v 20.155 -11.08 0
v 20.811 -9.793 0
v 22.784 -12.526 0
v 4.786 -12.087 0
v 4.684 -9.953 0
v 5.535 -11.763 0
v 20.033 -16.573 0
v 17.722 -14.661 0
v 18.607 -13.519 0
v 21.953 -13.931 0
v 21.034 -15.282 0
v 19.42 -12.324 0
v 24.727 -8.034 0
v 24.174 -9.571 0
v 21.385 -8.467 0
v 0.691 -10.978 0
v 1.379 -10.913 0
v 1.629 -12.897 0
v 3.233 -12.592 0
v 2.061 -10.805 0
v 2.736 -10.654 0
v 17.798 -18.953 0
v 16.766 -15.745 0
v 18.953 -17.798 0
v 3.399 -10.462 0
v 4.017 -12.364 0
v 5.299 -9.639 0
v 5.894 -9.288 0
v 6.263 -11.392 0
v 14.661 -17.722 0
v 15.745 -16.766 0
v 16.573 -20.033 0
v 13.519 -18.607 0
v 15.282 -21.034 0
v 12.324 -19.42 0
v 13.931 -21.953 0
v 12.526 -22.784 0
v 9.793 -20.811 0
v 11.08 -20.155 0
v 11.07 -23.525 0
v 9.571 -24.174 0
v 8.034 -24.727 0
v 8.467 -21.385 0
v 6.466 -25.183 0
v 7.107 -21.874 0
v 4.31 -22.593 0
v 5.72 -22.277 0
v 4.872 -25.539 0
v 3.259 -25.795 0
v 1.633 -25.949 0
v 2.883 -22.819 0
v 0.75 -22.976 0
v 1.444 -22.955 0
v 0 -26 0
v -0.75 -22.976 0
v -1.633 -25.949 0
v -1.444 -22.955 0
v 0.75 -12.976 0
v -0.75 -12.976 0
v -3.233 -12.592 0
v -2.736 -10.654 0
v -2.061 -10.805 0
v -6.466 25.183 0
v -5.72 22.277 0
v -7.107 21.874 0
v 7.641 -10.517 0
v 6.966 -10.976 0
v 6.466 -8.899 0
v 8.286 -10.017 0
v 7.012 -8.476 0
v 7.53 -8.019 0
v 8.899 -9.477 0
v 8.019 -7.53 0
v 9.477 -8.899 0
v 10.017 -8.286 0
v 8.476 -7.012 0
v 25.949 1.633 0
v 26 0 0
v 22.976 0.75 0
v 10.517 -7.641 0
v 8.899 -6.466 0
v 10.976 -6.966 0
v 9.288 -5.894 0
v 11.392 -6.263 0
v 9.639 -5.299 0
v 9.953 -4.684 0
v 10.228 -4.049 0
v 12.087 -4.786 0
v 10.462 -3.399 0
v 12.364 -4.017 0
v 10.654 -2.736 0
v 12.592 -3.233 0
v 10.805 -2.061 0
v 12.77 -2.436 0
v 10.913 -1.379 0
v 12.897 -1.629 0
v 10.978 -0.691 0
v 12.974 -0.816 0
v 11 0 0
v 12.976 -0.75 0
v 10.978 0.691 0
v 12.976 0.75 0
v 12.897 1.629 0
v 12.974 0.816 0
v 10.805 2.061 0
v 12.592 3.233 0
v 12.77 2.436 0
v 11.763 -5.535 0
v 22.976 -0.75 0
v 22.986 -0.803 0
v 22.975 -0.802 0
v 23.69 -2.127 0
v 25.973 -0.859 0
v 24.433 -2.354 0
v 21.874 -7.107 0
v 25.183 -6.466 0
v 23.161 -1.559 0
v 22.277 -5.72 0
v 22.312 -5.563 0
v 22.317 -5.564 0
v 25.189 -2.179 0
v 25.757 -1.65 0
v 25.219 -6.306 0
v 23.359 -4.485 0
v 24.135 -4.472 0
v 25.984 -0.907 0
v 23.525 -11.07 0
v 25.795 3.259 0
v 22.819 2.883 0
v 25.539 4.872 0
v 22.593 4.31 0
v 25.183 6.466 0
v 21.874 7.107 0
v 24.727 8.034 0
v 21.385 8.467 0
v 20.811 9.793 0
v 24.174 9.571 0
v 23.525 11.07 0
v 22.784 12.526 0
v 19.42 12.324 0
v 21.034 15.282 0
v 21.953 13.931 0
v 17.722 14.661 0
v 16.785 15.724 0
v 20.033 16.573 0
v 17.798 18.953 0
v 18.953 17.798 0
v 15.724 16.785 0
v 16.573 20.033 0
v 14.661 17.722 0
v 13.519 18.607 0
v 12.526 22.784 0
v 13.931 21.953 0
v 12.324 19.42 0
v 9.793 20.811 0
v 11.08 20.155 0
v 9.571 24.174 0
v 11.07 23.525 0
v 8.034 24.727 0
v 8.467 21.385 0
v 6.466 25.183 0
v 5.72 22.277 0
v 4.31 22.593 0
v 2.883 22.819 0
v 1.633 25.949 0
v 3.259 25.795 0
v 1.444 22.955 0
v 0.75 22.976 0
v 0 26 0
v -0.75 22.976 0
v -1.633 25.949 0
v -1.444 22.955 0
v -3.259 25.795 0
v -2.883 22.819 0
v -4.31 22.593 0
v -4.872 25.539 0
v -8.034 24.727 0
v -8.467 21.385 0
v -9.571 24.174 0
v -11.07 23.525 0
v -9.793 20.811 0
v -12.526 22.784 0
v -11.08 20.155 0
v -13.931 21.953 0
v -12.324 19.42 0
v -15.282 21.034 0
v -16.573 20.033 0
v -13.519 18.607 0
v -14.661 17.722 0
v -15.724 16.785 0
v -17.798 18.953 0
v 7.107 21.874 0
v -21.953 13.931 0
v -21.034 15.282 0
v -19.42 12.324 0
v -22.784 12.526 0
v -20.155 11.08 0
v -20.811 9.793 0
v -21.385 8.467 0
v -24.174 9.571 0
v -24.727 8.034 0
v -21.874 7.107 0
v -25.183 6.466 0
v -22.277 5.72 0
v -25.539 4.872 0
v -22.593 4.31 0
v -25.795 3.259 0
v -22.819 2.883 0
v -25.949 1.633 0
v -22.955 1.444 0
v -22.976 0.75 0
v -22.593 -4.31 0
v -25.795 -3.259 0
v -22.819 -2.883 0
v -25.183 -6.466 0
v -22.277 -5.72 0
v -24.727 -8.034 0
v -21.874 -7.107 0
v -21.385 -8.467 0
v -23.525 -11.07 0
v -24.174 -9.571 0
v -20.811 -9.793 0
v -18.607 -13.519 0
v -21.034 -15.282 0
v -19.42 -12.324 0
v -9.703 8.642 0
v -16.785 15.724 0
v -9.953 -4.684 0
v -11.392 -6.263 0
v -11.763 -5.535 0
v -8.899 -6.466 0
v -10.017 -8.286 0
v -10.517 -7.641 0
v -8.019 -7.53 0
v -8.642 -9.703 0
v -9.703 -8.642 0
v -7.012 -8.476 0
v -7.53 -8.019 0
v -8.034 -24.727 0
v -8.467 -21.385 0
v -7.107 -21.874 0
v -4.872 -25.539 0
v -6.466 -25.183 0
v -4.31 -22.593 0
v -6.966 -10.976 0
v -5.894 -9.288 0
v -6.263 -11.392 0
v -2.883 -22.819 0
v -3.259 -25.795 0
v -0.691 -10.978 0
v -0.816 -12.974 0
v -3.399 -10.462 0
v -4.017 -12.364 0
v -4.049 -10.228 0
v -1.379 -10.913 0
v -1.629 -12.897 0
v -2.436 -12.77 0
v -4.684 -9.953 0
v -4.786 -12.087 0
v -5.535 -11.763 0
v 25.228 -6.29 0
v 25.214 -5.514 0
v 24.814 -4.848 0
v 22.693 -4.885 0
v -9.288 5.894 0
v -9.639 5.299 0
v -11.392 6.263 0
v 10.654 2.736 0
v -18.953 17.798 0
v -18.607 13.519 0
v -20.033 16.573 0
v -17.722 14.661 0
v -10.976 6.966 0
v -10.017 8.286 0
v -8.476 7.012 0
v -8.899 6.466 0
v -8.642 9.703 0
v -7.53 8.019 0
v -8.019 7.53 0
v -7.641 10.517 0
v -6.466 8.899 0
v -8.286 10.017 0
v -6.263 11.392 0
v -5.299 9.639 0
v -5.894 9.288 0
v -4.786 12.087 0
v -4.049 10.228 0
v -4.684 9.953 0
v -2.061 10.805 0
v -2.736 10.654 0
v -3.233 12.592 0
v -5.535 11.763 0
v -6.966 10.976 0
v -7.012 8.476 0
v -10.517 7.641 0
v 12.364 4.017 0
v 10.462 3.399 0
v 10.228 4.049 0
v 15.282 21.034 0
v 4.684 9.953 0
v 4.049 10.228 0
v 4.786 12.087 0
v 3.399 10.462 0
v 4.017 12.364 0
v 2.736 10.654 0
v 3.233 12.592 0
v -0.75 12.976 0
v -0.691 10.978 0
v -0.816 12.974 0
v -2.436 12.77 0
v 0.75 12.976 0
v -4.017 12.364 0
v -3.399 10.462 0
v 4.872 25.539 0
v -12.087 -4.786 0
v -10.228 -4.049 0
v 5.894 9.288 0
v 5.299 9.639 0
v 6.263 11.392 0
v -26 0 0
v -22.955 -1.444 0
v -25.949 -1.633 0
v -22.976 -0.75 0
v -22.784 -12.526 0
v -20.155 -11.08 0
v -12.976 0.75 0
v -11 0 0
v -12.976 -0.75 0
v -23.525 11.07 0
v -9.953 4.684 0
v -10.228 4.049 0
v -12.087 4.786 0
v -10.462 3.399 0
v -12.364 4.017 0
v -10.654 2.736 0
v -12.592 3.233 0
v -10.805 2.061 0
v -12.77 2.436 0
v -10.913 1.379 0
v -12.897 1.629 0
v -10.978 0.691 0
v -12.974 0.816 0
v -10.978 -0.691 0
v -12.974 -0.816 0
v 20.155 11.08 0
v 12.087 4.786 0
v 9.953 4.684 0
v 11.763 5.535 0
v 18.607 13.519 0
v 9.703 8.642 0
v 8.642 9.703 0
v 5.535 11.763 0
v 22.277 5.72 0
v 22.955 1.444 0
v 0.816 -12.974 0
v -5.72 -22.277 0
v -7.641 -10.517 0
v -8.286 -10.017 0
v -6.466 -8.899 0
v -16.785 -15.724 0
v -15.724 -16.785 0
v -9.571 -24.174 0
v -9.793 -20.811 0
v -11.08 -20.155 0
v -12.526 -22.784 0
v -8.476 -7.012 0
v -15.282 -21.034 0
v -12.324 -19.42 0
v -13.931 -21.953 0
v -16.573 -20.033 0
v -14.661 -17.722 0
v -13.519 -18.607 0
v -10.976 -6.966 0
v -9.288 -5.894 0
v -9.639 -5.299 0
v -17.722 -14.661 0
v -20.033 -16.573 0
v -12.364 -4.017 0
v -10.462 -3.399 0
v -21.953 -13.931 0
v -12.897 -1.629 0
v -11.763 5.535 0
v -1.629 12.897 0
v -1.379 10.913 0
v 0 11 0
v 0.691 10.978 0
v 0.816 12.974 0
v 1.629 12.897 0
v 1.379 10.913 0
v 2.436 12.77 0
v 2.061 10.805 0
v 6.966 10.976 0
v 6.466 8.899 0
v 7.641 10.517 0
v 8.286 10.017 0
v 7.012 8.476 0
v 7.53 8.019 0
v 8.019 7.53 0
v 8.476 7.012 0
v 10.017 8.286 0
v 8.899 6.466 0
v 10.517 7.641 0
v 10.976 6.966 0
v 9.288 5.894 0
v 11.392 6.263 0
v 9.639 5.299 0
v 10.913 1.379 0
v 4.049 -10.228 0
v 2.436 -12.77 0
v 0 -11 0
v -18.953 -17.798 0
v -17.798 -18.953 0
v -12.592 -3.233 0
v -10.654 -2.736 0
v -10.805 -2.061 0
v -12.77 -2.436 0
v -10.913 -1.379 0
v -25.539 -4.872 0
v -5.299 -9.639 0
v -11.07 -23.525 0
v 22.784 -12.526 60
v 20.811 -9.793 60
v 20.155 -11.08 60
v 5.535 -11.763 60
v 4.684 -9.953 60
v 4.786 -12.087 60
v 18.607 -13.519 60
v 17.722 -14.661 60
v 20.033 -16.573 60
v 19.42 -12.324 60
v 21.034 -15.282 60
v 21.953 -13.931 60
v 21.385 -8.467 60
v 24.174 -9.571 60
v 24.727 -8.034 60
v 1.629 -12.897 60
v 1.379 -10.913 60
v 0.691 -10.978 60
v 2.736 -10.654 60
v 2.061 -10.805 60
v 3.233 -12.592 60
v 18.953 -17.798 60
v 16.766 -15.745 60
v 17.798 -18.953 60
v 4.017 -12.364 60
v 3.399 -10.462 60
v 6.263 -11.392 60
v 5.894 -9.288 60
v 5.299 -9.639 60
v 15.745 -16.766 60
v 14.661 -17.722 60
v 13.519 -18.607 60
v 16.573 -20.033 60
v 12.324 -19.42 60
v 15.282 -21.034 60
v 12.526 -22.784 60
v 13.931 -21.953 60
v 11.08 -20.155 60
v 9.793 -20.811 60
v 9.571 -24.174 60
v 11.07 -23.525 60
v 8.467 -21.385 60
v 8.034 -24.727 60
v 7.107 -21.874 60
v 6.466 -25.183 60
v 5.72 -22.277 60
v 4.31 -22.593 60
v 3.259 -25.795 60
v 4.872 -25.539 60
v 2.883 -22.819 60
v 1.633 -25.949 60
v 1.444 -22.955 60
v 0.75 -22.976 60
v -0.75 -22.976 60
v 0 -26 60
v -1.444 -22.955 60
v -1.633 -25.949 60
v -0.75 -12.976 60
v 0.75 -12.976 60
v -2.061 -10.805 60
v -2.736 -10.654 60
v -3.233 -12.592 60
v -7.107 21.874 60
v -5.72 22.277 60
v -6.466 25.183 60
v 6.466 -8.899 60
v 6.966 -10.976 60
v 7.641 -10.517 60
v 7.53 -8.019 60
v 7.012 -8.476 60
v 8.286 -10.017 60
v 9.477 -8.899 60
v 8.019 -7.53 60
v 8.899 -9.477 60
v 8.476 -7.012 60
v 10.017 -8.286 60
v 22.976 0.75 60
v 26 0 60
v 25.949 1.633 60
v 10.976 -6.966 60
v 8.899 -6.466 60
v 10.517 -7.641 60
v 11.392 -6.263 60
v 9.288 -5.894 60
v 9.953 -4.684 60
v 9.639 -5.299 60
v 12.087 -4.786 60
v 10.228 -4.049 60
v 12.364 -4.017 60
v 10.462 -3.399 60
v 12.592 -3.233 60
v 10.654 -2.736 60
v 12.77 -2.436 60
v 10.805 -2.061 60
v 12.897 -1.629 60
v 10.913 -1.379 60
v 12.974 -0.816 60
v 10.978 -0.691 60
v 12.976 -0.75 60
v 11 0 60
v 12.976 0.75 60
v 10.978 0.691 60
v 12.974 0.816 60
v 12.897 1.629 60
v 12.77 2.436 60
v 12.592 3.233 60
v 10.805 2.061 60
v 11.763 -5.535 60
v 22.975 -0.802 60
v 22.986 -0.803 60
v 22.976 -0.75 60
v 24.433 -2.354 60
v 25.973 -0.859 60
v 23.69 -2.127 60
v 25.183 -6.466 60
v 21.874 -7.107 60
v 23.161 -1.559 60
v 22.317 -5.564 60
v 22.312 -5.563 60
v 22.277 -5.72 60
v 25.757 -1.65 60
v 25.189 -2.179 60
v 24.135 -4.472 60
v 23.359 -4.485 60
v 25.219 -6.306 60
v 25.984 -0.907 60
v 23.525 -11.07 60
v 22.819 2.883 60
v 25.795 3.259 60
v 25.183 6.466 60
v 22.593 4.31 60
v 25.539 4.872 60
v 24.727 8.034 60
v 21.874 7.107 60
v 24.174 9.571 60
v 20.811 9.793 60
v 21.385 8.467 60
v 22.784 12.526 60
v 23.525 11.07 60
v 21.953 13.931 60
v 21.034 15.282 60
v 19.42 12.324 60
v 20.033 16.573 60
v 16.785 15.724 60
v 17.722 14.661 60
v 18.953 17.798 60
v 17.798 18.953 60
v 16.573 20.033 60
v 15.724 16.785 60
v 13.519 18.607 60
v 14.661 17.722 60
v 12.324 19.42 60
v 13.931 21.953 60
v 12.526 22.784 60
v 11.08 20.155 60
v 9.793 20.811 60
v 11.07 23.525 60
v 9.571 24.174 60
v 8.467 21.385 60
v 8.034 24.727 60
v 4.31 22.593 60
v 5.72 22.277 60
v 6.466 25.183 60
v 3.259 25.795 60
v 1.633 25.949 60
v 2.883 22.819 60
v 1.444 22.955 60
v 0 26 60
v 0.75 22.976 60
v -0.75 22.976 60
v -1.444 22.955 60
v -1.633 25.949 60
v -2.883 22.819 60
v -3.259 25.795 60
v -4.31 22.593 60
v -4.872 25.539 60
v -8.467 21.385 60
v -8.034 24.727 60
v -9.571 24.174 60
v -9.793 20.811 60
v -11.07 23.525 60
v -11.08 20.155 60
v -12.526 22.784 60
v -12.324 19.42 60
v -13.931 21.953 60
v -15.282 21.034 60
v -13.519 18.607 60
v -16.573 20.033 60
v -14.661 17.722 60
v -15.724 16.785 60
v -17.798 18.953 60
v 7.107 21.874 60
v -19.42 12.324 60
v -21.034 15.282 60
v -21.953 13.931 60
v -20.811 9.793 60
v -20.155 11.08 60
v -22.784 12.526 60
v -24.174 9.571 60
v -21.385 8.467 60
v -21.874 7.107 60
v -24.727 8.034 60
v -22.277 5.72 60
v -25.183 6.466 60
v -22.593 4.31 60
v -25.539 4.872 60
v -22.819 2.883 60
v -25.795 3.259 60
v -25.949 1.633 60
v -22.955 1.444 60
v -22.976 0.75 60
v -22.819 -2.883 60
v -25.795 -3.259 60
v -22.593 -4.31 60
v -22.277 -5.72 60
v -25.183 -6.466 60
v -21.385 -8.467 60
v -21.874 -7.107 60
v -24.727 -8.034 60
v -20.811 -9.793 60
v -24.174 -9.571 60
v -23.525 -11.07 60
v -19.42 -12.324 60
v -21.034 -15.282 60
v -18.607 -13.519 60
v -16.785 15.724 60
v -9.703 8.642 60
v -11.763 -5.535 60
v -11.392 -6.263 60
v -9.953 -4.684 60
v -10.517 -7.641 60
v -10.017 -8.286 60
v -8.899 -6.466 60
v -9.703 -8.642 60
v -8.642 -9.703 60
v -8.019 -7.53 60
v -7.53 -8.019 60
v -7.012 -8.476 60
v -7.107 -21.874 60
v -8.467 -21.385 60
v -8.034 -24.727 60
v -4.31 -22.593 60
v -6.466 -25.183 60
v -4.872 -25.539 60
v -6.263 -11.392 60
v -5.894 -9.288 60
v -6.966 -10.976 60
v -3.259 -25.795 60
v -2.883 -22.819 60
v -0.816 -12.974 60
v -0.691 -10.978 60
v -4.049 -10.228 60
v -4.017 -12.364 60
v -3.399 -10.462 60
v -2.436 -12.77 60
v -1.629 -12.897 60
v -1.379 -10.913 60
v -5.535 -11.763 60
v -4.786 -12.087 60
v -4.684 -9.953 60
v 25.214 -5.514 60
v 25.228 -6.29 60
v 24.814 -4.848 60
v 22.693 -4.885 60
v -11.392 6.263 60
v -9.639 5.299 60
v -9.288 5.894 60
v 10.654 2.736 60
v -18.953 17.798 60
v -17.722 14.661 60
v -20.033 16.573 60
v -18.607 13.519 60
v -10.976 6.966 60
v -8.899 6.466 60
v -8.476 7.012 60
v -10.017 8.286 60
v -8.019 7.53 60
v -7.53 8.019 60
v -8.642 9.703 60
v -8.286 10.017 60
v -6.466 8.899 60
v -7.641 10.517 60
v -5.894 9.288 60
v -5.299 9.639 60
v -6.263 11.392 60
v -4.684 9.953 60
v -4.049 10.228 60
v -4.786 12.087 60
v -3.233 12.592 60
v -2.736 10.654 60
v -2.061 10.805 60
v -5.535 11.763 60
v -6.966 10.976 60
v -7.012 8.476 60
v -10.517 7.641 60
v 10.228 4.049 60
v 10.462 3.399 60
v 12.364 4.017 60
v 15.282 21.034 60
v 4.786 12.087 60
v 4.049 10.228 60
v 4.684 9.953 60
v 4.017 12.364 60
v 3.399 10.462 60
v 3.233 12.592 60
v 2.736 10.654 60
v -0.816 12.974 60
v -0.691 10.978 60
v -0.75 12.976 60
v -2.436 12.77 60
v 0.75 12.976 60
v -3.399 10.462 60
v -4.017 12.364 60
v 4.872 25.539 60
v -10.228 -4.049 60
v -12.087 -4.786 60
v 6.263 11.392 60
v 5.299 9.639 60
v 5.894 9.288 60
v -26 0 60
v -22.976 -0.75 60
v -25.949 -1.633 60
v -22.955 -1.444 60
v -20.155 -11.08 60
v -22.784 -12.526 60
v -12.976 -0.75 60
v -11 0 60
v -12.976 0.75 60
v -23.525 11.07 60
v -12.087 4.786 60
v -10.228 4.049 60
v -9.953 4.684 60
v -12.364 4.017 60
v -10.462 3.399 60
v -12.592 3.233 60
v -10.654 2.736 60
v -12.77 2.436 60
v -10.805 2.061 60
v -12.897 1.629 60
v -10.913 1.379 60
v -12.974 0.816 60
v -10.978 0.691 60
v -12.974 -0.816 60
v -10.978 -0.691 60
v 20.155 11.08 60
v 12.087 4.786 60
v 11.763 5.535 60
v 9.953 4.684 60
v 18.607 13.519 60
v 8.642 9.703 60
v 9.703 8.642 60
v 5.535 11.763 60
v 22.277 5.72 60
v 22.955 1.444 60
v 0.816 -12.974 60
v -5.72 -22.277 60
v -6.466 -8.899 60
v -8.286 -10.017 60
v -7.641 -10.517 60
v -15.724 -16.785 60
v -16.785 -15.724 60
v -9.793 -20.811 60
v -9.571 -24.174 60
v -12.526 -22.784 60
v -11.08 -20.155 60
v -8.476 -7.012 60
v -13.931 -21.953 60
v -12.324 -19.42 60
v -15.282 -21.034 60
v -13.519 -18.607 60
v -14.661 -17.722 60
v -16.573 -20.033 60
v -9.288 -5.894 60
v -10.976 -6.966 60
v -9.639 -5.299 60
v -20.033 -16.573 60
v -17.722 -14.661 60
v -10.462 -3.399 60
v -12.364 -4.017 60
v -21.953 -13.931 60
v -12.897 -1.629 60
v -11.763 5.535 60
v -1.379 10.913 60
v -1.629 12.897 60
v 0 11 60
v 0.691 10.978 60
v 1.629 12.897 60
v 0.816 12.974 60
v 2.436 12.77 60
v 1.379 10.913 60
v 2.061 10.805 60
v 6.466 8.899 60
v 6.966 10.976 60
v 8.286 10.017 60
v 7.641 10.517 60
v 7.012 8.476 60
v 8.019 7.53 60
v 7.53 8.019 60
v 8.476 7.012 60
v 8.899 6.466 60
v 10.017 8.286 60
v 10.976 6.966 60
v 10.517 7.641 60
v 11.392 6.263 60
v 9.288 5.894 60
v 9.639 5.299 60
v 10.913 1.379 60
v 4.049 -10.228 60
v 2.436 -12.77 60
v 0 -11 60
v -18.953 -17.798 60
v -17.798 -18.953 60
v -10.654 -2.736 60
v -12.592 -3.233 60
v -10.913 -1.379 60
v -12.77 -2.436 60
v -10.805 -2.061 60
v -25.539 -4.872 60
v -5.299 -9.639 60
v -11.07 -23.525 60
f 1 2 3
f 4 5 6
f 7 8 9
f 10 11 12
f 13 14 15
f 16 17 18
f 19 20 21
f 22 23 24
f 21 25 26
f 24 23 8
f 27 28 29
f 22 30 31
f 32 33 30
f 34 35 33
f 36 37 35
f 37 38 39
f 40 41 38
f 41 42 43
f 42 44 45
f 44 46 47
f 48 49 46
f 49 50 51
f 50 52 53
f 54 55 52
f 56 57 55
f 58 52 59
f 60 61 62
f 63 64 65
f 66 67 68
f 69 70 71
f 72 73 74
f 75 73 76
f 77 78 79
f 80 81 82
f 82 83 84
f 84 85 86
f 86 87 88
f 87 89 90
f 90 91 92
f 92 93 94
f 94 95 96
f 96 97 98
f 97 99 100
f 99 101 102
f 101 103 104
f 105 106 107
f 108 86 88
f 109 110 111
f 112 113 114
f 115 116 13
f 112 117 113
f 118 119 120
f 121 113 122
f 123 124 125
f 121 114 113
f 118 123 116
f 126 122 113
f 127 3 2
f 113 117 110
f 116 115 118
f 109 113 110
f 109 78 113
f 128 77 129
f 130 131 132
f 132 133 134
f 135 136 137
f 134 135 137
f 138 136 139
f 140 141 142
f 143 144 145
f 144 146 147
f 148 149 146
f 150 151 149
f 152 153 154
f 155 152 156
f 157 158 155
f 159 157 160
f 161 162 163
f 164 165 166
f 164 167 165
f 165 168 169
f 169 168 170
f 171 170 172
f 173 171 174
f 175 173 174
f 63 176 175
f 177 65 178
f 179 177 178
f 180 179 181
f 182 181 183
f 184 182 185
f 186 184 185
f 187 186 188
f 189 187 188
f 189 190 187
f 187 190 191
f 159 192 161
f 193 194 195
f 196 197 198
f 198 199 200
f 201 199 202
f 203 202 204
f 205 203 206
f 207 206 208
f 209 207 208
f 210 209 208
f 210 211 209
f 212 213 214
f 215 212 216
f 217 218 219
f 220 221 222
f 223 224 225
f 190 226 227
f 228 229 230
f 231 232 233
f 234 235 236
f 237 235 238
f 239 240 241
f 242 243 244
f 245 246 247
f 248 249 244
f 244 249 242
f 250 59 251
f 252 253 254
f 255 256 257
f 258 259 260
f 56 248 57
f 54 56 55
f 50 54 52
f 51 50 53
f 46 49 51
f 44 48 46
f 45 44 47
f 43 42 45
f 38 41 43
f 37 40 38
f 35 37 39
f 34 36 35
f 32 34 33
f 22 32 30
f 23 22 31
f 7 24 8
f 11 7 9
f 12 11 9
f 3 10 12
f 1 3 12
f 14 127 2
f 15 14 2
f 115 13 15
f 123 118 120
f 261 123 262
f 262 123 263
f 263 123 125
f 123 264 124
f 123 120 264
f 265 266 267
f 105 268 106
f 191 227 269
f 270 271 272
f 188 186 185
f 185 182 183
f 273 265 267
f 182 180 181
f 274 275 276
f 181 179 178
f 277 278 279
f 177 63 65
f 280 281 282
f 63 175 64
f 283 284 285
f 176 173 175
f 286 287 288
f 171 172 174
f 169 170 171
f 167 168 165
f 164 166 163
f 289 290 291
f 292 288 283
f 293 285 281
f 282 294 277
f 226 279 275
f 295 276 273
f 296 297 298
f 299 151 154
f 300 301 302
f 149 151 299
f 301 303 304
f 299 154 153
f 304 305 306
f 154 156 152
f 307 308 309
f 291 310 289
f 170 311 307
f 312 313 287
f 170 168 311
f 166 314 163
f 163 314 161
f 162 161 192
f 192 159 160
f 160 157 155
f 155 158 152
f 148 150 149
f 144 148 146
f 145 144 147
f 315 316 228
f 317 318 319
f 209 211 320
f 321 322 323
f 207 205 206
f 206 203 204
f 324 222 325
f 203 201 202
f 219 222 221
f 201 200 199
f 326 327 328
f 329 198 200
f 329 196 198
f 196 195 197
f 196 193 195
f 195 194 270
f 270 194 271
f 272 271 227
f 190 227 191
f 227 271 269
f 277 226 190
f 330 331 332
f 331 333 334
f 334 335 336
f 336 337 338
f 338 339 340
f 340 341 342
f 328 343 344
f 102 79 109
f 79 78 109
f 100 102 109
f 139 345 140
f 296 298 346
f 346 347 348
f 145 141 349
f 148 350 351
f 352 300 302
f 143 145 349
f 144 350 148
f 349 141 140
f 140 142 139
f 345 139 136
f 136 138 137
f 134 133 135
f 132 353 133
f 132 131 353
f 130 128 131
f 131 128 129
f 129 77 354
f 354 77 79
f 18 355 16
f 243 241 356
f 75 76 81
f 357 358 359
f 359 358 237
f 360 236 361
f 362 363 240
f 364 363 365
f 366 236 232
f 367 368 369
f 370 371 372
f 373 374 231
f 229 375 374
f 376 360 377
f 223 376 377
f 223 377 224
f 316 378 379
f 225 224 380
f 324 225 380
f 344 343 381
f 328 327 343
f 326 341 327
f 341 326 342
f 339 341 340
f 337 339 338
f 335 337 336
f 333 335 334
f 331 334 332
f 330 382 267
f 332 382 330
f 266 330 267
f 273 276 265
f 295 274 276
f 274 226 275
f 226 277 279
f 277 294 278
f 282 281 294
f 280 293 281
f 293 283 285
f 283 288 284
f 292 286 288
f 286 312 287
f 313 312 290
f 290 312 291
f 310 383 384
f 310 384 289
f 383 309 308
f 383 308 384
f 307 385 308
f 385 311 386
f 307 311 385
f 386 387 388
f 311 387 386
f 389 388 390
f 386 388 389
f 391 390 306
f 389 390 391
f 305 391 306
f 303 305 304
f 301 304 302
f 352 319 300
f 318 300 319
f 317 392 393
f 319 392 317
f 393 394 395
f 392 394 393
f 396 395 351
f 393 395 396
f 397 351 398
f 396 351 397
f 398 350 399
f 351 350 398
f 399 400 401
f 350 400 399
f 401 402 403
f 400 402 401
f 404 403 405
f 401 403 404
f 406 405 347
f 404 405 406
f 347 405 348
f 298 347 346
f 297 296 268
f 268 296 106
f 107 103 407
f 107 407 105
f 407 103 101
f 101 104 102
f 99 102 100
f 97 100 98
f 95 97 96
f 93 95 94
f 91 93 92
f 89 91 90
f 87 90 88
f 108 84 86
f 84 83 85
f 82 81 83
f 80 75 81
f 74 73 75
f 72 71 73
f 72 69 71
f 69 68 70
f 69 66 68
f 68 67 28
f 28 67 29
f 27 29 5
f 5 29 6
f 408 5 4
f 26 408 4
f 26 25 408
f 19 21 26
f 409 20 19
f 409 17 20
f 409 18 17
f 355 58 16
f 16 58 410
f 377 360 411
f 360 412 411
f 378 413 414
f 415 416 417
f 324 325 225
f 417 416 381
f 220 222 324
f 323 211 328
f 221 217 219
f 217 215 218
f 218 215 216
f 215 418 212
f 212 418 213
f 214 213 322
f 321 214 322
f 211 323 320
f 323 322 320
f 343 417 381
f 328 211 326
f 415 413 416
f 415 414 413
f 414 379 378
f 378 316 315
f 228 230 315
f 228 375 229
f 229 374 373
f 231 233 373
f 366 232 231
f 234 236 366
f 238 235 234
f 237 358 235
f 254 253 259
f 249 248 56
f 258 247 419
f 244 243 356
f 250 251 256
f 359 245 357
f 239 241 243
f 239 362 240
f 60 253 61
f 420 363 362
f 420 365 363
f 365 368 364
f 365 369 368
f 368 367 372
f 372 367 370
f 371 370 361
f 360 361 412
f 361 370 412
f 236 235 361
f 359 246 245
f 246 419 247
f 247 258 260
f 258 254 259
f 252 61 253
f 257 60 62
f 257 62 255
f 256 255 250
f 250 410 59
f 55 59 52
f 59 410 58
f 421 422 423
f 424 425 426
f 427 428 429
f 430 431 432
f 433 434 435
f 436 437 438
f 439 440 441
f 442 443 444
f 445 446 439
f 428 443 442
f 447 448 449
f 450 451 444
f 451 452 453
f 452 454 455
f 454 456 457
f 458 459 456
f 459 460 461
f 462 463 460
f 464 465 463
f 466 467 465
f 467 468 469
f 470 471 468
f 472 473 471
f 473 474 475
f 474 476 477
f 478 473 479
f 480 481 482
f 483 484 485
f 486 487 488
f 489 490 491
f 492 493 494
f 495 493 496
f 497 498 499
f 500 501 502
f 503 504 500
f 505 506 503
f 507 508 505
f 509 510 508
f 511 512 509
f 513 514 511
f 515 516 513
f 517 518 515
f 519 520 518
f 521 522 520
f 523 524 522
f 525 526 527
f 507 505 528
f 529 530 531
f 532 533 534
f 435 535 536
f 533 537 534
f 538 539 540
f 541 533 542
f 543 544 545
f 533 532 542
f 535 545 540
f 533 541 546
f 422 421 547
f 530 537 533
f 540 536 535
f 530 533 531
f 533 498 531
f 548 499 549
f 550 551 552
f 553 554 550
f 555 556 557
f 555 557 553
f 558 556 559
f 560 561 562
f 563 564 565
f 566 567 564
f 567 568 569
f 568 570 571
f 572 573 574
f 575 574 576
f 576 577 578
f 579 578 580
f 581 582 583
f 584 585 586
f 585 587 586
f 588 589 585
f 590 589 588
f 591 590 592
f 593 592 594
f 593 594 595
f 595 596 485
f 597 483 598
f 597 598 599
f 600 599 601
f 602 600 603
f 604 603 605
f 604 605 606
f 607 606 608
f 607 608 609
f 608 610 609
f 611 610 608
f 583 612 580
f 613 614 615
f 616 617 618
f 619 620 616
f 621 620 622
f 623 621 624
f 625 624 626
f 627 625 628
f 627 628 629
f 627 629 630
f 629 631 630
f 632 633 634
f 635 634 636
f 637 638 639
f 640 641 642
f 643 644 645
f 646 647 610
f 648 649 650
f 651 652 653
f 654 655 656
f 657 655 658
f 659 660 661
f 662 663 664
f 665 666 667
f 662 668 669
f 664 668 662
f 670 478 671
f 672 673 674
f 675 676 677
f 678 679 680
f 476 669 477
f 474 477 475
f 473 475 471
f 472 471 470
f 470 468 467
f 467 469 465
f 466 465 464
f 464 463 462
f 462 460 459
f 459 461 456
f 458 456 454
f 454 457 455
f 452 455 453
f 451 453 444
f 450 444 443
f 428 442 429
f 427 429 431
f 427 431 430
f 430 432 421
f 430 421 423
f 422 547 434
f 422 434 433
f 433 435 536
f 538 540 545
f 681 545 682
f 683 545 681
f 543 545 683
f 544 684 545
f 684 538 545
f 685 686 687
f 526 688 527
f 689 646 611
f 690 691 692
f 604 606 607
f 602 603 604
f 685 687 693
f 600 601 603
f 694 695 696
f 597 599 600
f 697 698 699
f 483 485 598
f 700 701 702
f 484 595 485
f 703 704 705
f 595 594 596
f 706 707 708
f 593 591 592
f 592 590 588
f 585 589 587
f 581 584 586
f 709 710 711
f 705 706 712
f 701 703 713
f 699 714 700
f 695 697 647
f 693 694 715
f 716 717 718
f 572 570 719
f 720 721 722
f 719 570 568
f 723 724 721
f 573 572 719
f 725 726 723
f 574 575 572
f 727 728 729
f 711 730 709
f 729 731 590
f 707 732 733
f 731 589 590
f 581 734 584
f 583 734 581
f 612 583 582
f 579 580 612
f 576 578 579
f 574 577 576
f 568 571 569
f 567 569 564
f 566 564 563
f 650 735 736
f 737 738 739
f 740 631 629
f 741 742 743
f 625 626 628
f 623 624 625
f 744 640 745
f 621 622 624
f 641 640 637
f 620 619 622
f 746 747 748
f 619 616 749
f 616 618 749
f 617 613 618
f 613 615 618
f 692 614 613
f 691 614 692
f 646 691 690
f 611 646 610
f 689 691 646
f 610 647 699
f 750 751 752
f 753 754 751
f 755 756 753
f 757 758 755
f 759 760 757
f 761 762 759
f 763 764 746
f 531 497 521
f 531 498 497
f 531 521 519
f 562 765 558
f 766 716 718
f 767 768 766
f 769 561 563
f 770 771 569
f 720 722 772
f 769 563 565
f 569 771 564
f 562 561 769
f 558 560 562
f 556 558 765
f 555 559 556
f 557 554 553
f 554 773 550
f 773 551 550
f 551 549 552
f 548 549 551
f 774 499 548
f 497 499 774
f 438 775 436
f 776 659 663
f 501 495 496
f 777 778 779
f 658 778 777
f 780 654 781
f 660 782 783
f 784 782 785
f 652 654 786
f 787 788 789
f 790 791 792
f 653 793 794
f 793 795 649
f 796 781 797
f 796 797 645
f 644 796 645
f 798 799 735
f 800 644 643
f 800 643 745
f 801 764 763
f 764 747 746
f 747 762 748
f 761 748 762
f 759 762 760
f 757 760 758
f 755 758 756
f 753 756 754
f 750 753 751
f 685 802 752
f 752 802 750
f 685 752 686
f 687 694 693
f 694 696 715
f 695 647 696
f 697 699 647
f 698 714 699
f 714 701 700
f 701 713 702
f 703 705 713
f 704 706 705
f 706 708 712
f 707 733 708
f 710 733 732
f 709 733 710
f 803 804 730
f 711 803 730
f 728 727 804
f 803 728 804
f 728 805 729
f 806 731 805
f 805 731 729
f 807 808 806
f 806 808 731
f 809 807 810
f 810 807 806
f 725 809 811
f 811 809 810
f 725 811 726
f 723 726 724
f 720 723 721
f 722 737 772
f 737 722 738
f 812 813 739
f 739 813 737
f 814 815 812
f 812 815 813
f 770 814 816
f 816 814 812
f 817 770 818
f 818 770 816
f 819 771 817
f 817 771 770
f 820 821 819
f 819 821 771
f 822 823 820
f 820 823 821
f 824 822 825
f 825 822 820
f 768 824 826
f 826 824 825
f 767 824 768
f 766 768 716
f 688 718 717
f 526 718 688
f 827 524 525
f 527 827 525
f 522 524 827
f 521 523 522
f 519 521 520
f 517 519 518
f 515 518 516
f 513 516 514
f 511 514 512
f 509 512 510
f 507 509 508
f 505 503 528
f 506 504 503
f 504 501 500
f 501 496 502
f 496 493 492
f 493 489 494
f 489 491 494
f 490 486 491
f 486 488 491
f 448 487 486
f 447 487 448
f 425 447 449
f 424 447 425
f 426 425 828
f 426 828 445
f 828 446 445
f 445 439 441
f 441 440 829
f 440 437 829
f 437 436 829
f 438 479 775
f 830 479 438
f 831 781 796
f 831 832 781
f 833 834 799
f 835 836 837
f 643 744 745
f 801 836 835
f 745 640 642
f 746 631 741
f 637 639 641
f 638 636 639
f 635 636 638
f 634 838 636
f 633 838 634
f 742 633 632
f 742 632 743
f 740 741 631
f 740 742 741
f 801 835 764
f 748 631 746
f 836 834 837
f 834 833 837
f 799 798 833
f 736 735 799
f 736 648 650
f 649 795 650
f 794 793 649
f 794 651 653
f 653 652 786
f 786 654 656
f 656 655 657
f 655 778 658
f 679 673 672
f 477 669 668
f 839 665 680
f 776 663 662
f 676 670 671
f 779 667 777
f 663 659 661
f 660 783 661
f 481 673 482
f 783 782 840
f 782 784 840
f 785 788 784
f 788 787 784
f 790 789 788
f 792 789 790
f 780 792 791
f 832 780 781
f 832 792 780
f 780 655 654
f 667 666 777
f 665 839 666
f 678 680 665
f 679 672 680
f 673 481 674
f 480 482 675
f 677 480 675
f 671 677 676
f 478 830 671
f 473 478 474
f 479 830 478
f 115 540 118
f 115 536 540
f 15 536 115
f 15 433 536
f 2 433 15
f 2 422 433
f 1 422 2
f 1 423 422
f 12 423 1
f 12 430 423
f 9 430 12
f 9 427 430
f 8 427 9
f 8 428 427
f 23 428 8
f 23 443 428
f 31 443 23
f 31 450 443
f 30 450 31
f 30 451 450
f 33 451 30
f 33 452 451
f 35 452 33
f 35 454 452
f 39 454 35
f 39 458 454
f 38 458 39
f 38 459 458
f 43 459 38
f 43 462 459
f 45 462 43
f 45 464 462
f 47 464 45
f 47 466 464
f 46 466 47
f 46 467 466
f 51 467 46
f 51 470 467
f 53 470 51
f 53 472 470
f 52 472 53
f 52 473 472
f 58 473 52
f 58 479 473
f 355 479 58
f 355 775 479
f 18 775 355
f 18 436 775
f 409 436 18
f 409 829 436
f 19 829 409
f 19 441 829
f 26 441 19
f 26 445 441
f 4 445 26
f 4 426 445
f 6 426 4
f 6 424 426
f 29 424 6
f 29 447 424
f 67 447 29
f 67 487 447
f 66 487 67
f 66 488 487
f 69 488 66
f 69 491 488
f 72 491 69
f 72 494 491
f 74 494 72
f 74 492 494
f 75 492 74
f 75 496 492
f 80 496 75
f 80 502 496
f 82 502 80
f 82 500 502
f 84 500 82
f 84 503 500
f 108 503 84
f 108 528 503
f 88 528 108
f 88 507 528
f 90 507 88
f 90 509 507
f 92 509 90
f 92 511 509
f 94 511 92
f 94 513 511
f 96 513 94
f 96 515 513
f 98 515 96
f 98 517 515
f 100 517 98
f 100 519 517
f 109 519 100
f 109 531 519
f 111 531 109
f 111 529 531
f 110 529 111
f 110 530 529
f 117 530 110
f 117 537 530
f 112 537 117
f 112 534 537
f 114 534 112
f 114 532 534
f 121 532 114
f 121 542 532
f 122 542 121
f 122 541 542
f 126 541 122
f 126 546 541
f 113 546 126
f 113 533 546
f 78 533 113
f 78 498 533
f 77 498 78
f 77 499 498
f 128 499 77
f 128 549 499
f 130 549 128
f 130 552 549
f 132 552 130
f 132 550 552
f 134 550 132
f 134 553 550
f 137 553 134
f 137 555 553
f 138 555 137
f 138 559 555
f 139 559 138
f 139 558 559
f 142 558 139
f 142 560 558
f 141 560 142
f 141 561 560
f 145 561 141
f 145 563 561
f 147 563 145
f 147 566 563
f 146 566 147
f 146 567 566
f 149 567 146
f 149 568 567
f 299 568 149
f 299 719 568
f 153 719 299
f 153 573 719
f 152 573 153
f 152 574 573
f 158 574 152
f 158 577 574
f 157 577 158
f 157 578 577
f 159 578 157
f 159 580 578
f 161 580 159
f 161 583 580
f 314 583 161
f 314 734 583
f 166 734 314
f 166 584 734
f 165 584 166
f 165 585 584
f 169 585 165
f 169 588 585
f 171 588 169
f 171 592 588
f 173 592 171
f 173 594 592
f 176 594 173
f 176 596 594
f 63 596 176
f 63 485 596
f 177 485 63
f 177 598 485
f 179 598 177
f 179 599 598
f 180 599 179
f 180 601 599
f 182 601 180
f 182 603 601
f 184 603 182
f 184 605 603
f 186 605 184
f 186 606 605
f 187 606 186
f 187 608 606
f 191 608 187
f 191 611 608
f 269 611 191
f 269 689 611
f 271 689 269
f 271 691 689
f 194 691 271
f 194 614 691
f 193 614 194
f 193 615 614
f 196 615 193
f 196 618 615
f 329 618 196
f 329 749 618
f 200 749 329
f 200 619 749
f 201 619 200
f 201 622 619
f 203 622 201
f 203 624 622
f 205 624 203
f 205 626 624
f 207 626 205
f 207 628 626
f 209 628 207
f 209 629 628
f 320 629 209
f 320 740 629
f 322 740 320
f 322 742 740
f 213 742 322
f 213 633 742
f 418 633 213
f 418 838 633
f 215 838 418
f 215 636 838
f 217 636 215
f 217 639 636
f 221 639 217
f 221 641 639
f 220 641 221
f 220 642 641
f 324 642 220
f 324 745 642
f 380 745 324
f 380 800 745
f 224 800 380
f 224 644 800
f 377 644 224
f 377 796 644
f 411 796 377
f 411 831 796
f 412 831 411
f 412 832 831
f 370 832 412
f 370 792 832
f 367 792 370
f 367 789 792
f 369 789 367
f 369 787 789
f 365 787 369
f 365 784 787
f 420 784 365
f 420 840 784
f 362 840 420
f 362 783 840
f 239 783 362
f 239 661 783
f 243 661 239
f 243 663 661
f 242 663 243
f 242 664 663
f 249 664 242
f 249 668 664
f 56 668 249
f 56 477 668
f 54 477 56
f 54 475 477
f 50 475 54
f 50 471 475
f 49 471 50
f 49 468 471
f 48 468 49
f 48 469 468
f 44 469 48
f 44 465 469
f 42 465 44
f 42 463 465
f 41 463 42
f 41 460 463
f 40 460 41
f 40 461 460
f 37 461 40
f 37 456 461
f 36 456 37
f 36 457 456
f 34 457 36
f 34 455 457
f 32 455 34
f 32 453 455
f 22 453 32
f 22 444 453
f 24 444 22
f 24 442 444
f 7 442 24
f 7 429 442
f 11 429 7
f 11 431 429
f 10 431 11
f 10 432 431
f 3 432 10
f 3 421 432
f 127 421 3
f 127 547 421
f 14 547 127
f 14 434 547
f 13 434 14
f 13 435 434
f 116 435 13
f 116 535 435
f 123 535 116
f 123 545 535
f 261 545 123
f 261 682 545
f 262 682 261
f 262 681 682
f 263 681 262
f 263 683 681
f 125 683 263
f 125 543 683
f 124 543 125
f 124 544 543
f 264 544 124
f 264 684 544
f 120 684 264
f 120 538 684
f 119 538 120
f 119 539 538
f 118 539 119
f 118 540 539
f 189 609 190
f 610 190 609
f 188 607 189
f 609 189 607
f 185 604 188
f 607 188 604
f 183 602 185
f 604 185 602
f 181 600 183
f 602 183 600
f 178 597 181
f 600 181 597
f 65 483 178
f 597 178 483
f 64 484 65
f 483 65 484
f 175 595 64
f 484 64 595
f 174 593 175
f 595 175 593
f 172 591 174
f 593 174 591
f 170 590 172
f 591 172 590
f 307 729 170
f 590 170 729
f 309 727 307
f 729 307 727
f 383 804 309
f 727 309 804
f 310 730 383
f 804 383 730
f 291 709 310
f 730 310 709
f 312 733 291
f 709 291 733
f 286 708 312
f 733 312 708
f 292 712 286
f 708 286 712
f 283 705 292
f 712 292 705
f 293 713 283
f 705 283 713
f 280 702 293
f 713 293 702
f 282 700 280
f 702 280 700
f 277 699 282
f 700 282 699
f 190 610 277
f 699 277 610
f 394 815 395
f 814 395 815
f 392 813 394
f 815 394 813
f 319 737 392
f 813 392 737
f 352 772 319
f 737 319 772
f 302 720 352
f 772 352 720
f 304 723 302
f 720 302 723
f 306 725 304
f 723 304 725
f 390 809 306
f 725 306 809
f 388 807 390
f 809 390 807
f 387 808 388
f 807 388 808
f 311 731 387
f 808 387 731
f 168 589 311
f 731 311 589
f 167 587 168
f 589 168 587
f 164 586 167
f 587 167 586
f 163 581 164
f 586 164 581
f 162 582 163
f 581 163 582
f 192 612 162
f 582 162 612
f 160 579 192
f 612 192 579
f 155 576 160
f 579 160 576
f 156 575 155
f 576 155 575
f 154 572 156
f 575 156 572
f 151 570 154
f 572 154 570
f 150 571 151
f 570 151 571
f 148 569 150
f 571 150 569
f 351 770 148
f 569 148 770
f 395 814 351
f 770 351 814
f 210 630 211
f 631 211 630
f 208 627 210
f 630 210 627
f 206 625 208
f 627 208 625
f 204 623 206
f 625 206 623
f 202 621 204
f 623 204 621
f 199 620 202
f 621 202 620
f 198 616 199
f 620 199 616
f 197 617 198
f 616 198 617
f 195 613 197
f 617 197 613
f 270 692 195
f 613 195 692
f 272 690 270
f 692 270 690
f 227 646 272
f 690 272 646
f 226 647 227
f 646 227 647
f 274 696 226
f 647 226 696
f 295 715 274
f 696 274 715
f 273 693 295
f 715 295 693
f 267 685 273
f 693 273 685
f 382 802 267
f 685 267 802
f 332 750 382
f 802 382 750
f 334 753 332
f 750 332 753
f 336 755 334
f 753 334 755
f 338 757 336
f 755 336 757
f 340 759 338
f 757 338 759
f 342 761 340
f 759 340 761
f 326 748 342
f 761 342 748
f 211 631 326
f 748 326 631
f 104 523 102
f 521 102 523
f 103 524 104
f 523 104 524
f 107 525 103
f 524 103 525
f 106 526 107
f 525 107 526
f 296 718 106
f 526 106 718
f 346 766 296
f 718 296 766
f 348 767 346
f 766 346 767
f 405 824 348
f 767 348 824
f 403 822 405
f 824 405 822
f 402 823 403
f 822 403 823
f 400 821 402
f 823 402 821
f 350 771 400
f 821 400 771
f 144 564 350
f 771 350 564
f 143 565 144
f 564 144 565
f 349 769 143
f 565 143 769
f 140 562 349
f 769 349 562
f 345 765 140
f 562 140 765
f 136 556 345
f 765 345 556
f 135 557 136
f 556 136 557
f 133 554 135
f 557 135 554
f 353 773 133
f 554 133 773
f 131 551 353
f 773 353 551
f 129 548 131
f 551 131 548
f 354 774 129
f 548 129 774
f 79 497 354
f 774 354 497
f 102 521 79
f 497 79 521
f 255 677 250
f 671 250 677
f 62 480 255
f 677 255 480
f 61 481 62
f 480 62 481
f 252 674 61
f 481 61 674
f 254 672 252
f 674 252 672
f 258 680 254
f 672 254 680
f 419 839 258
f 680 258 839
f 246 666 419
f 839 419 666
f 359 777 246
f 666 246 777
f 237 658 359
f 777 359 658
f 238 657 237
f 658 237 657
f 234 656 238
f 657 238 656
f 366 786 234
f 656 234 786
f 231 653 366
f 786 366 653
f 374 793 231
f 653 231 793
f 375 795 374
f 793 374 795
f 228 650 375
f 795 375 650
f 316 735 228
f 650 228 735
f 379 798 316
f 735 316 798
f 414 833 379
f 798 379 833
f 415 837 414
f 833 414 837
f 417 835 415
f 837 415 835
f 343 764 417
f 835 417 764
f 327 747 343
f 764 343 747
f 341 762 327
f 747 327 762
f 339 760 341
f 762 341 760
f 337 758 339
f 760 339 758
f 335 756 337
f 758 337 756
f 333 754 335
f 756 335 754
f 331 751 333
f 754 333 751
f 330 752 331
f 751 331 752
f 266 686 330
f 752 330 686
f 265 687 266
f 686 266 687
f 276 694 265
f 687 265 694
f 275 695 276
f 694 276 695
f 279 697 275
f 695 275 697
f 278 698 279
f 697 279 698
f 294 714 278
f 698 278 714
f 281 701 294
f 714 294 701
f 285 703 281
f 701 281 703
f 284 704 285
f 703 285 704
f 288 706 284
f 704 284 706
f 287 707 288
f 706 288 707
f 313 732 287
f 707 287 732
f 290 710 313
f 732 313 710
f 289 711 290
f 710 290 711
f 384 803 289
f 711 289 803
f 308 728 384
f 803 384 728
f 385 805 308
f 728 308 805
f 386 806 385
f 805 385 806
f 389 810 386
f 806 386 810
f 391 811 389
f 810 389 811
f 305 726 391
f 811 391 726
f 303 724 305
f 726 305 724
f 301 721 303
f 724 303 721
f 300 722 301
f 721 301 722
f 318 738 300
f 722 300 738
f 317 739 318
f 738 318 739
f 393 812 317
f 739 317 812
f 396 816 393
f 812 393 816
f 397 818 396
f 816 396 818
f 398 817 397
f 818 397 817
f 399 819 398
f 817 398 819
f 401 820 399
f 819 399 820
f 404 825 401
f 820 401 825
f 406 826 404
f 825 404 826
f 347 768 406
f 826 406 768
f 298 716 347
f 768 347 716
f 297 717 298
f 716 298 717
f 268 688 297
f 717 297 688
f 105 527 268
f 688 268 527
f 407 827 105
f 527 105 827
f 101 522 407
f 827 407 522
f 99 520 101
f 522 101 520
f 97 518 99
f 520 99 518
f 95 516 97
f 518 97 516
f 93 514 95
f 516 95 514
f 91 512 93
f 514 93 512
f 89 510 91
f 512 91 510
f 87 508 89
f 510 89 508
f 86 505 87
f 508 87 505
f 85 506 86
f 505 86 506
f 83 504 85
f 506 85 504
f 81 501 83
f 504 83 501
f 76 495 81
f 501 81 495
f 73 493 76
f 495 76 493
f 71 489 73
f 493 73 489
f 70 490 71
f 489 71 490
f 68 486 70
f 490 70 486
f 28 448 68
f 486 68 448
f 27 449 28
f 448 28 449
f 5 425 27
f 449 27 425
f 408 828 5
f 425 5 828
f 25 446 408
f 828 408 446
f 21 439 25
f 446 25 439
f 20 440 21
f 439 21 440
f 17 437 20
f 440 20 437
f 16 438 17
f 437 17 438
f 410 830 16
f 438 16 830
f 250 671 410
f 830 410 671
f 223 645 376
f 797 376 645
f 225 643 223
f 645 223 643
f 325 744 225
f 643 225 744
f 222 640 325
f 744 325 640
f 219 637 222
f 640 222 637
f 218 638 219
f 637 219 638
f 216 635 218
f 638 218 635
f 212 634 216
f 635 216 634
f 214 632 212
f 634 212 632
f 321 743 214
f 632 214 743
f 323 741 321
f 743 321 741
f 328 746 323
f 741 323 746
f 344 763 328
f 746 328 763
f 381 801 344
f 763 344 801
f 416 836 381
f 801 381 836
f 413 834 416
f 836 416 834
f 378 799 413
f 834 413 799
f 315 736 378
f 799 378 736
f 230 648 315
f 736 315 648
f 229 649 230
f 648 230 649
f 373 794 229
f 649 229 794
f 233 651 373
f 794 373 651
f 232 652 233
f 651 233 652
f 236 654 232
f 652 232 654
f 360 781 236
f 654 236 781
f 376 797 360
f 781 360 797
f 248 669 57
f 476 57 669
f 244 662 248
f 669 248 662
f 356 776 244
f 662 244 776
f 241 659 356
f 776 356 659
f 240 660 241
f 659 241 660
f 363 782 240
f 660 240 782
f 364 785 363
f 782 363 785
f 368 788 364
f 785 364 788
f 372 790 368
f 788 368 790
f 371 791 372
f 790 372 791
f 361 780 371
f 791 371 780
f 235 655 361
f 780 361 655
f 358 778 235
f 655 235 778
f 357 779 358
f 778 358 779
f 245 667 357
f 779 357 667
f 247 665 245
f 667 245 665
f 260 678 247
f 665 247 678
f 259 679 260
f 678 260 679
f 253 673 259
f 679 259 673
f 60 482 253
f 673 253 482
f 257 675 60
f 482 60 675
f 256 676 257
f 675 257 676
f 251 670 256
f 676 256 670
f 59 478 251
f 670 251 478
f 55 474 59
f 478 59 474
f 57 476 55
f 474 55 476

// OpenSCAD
infinity=100;

$fn=100;

/**
 * 
 */
module reel_axis(height=50, inner_diameter=22, outer_diameter=50, inner_thickness=2, wall_thickness=1.5, outer_thickness=3, a=-12, a0=-8, n_wall=8) {



linear_extrude(height=height)
    difference() {
        union() {
            
            difference() {
                circle(d = inner_diameter + inner_thickness * 2);
                circle(d = inner_diameter);
            }

            difference() {
                circle(d = outer_diameter);
                circle(d = outer_diameter - outer_thickness * 2);
                rotate([0,0,a0])
                    polygon(points=[[0,0],[infinity*cos(a/2),infinity*sin(a/2)],[infinity*cos(a/2),-infinity*sin(a/2)]]);
            }

            for(i=[0:n_wall-2])
                rotate([0,0,360/n_wall*i])
                    translate([inner_diameter/2 + inner_thickness/2,
                            -wall_thickness/2,
                            0])
                       square([(outer_diameter - inner_diameter - inner_thickness - outer_thickness)/2, wall_thickness]);
            for(j=[-1,1])
                rotate([0,0,a/2*j + a0])
                    translate([(outer_diameter-outer_thickness)/2,0,0])
                       # circle(d=outer_thickness,$fn=12);
        }
    }
}

module reel_axis_p(a=50) {
     reel_axis(height=a,inner_diameter=a/50*22, outer_diameter=a, inner_thickness=a/50*2, wall_thickness=a/50*1.5, outer_thickness=a/50*3, a=-12, a0=-8, n_wall=8);
    
}

reel_axis(height=60, outer_diameter=52);
